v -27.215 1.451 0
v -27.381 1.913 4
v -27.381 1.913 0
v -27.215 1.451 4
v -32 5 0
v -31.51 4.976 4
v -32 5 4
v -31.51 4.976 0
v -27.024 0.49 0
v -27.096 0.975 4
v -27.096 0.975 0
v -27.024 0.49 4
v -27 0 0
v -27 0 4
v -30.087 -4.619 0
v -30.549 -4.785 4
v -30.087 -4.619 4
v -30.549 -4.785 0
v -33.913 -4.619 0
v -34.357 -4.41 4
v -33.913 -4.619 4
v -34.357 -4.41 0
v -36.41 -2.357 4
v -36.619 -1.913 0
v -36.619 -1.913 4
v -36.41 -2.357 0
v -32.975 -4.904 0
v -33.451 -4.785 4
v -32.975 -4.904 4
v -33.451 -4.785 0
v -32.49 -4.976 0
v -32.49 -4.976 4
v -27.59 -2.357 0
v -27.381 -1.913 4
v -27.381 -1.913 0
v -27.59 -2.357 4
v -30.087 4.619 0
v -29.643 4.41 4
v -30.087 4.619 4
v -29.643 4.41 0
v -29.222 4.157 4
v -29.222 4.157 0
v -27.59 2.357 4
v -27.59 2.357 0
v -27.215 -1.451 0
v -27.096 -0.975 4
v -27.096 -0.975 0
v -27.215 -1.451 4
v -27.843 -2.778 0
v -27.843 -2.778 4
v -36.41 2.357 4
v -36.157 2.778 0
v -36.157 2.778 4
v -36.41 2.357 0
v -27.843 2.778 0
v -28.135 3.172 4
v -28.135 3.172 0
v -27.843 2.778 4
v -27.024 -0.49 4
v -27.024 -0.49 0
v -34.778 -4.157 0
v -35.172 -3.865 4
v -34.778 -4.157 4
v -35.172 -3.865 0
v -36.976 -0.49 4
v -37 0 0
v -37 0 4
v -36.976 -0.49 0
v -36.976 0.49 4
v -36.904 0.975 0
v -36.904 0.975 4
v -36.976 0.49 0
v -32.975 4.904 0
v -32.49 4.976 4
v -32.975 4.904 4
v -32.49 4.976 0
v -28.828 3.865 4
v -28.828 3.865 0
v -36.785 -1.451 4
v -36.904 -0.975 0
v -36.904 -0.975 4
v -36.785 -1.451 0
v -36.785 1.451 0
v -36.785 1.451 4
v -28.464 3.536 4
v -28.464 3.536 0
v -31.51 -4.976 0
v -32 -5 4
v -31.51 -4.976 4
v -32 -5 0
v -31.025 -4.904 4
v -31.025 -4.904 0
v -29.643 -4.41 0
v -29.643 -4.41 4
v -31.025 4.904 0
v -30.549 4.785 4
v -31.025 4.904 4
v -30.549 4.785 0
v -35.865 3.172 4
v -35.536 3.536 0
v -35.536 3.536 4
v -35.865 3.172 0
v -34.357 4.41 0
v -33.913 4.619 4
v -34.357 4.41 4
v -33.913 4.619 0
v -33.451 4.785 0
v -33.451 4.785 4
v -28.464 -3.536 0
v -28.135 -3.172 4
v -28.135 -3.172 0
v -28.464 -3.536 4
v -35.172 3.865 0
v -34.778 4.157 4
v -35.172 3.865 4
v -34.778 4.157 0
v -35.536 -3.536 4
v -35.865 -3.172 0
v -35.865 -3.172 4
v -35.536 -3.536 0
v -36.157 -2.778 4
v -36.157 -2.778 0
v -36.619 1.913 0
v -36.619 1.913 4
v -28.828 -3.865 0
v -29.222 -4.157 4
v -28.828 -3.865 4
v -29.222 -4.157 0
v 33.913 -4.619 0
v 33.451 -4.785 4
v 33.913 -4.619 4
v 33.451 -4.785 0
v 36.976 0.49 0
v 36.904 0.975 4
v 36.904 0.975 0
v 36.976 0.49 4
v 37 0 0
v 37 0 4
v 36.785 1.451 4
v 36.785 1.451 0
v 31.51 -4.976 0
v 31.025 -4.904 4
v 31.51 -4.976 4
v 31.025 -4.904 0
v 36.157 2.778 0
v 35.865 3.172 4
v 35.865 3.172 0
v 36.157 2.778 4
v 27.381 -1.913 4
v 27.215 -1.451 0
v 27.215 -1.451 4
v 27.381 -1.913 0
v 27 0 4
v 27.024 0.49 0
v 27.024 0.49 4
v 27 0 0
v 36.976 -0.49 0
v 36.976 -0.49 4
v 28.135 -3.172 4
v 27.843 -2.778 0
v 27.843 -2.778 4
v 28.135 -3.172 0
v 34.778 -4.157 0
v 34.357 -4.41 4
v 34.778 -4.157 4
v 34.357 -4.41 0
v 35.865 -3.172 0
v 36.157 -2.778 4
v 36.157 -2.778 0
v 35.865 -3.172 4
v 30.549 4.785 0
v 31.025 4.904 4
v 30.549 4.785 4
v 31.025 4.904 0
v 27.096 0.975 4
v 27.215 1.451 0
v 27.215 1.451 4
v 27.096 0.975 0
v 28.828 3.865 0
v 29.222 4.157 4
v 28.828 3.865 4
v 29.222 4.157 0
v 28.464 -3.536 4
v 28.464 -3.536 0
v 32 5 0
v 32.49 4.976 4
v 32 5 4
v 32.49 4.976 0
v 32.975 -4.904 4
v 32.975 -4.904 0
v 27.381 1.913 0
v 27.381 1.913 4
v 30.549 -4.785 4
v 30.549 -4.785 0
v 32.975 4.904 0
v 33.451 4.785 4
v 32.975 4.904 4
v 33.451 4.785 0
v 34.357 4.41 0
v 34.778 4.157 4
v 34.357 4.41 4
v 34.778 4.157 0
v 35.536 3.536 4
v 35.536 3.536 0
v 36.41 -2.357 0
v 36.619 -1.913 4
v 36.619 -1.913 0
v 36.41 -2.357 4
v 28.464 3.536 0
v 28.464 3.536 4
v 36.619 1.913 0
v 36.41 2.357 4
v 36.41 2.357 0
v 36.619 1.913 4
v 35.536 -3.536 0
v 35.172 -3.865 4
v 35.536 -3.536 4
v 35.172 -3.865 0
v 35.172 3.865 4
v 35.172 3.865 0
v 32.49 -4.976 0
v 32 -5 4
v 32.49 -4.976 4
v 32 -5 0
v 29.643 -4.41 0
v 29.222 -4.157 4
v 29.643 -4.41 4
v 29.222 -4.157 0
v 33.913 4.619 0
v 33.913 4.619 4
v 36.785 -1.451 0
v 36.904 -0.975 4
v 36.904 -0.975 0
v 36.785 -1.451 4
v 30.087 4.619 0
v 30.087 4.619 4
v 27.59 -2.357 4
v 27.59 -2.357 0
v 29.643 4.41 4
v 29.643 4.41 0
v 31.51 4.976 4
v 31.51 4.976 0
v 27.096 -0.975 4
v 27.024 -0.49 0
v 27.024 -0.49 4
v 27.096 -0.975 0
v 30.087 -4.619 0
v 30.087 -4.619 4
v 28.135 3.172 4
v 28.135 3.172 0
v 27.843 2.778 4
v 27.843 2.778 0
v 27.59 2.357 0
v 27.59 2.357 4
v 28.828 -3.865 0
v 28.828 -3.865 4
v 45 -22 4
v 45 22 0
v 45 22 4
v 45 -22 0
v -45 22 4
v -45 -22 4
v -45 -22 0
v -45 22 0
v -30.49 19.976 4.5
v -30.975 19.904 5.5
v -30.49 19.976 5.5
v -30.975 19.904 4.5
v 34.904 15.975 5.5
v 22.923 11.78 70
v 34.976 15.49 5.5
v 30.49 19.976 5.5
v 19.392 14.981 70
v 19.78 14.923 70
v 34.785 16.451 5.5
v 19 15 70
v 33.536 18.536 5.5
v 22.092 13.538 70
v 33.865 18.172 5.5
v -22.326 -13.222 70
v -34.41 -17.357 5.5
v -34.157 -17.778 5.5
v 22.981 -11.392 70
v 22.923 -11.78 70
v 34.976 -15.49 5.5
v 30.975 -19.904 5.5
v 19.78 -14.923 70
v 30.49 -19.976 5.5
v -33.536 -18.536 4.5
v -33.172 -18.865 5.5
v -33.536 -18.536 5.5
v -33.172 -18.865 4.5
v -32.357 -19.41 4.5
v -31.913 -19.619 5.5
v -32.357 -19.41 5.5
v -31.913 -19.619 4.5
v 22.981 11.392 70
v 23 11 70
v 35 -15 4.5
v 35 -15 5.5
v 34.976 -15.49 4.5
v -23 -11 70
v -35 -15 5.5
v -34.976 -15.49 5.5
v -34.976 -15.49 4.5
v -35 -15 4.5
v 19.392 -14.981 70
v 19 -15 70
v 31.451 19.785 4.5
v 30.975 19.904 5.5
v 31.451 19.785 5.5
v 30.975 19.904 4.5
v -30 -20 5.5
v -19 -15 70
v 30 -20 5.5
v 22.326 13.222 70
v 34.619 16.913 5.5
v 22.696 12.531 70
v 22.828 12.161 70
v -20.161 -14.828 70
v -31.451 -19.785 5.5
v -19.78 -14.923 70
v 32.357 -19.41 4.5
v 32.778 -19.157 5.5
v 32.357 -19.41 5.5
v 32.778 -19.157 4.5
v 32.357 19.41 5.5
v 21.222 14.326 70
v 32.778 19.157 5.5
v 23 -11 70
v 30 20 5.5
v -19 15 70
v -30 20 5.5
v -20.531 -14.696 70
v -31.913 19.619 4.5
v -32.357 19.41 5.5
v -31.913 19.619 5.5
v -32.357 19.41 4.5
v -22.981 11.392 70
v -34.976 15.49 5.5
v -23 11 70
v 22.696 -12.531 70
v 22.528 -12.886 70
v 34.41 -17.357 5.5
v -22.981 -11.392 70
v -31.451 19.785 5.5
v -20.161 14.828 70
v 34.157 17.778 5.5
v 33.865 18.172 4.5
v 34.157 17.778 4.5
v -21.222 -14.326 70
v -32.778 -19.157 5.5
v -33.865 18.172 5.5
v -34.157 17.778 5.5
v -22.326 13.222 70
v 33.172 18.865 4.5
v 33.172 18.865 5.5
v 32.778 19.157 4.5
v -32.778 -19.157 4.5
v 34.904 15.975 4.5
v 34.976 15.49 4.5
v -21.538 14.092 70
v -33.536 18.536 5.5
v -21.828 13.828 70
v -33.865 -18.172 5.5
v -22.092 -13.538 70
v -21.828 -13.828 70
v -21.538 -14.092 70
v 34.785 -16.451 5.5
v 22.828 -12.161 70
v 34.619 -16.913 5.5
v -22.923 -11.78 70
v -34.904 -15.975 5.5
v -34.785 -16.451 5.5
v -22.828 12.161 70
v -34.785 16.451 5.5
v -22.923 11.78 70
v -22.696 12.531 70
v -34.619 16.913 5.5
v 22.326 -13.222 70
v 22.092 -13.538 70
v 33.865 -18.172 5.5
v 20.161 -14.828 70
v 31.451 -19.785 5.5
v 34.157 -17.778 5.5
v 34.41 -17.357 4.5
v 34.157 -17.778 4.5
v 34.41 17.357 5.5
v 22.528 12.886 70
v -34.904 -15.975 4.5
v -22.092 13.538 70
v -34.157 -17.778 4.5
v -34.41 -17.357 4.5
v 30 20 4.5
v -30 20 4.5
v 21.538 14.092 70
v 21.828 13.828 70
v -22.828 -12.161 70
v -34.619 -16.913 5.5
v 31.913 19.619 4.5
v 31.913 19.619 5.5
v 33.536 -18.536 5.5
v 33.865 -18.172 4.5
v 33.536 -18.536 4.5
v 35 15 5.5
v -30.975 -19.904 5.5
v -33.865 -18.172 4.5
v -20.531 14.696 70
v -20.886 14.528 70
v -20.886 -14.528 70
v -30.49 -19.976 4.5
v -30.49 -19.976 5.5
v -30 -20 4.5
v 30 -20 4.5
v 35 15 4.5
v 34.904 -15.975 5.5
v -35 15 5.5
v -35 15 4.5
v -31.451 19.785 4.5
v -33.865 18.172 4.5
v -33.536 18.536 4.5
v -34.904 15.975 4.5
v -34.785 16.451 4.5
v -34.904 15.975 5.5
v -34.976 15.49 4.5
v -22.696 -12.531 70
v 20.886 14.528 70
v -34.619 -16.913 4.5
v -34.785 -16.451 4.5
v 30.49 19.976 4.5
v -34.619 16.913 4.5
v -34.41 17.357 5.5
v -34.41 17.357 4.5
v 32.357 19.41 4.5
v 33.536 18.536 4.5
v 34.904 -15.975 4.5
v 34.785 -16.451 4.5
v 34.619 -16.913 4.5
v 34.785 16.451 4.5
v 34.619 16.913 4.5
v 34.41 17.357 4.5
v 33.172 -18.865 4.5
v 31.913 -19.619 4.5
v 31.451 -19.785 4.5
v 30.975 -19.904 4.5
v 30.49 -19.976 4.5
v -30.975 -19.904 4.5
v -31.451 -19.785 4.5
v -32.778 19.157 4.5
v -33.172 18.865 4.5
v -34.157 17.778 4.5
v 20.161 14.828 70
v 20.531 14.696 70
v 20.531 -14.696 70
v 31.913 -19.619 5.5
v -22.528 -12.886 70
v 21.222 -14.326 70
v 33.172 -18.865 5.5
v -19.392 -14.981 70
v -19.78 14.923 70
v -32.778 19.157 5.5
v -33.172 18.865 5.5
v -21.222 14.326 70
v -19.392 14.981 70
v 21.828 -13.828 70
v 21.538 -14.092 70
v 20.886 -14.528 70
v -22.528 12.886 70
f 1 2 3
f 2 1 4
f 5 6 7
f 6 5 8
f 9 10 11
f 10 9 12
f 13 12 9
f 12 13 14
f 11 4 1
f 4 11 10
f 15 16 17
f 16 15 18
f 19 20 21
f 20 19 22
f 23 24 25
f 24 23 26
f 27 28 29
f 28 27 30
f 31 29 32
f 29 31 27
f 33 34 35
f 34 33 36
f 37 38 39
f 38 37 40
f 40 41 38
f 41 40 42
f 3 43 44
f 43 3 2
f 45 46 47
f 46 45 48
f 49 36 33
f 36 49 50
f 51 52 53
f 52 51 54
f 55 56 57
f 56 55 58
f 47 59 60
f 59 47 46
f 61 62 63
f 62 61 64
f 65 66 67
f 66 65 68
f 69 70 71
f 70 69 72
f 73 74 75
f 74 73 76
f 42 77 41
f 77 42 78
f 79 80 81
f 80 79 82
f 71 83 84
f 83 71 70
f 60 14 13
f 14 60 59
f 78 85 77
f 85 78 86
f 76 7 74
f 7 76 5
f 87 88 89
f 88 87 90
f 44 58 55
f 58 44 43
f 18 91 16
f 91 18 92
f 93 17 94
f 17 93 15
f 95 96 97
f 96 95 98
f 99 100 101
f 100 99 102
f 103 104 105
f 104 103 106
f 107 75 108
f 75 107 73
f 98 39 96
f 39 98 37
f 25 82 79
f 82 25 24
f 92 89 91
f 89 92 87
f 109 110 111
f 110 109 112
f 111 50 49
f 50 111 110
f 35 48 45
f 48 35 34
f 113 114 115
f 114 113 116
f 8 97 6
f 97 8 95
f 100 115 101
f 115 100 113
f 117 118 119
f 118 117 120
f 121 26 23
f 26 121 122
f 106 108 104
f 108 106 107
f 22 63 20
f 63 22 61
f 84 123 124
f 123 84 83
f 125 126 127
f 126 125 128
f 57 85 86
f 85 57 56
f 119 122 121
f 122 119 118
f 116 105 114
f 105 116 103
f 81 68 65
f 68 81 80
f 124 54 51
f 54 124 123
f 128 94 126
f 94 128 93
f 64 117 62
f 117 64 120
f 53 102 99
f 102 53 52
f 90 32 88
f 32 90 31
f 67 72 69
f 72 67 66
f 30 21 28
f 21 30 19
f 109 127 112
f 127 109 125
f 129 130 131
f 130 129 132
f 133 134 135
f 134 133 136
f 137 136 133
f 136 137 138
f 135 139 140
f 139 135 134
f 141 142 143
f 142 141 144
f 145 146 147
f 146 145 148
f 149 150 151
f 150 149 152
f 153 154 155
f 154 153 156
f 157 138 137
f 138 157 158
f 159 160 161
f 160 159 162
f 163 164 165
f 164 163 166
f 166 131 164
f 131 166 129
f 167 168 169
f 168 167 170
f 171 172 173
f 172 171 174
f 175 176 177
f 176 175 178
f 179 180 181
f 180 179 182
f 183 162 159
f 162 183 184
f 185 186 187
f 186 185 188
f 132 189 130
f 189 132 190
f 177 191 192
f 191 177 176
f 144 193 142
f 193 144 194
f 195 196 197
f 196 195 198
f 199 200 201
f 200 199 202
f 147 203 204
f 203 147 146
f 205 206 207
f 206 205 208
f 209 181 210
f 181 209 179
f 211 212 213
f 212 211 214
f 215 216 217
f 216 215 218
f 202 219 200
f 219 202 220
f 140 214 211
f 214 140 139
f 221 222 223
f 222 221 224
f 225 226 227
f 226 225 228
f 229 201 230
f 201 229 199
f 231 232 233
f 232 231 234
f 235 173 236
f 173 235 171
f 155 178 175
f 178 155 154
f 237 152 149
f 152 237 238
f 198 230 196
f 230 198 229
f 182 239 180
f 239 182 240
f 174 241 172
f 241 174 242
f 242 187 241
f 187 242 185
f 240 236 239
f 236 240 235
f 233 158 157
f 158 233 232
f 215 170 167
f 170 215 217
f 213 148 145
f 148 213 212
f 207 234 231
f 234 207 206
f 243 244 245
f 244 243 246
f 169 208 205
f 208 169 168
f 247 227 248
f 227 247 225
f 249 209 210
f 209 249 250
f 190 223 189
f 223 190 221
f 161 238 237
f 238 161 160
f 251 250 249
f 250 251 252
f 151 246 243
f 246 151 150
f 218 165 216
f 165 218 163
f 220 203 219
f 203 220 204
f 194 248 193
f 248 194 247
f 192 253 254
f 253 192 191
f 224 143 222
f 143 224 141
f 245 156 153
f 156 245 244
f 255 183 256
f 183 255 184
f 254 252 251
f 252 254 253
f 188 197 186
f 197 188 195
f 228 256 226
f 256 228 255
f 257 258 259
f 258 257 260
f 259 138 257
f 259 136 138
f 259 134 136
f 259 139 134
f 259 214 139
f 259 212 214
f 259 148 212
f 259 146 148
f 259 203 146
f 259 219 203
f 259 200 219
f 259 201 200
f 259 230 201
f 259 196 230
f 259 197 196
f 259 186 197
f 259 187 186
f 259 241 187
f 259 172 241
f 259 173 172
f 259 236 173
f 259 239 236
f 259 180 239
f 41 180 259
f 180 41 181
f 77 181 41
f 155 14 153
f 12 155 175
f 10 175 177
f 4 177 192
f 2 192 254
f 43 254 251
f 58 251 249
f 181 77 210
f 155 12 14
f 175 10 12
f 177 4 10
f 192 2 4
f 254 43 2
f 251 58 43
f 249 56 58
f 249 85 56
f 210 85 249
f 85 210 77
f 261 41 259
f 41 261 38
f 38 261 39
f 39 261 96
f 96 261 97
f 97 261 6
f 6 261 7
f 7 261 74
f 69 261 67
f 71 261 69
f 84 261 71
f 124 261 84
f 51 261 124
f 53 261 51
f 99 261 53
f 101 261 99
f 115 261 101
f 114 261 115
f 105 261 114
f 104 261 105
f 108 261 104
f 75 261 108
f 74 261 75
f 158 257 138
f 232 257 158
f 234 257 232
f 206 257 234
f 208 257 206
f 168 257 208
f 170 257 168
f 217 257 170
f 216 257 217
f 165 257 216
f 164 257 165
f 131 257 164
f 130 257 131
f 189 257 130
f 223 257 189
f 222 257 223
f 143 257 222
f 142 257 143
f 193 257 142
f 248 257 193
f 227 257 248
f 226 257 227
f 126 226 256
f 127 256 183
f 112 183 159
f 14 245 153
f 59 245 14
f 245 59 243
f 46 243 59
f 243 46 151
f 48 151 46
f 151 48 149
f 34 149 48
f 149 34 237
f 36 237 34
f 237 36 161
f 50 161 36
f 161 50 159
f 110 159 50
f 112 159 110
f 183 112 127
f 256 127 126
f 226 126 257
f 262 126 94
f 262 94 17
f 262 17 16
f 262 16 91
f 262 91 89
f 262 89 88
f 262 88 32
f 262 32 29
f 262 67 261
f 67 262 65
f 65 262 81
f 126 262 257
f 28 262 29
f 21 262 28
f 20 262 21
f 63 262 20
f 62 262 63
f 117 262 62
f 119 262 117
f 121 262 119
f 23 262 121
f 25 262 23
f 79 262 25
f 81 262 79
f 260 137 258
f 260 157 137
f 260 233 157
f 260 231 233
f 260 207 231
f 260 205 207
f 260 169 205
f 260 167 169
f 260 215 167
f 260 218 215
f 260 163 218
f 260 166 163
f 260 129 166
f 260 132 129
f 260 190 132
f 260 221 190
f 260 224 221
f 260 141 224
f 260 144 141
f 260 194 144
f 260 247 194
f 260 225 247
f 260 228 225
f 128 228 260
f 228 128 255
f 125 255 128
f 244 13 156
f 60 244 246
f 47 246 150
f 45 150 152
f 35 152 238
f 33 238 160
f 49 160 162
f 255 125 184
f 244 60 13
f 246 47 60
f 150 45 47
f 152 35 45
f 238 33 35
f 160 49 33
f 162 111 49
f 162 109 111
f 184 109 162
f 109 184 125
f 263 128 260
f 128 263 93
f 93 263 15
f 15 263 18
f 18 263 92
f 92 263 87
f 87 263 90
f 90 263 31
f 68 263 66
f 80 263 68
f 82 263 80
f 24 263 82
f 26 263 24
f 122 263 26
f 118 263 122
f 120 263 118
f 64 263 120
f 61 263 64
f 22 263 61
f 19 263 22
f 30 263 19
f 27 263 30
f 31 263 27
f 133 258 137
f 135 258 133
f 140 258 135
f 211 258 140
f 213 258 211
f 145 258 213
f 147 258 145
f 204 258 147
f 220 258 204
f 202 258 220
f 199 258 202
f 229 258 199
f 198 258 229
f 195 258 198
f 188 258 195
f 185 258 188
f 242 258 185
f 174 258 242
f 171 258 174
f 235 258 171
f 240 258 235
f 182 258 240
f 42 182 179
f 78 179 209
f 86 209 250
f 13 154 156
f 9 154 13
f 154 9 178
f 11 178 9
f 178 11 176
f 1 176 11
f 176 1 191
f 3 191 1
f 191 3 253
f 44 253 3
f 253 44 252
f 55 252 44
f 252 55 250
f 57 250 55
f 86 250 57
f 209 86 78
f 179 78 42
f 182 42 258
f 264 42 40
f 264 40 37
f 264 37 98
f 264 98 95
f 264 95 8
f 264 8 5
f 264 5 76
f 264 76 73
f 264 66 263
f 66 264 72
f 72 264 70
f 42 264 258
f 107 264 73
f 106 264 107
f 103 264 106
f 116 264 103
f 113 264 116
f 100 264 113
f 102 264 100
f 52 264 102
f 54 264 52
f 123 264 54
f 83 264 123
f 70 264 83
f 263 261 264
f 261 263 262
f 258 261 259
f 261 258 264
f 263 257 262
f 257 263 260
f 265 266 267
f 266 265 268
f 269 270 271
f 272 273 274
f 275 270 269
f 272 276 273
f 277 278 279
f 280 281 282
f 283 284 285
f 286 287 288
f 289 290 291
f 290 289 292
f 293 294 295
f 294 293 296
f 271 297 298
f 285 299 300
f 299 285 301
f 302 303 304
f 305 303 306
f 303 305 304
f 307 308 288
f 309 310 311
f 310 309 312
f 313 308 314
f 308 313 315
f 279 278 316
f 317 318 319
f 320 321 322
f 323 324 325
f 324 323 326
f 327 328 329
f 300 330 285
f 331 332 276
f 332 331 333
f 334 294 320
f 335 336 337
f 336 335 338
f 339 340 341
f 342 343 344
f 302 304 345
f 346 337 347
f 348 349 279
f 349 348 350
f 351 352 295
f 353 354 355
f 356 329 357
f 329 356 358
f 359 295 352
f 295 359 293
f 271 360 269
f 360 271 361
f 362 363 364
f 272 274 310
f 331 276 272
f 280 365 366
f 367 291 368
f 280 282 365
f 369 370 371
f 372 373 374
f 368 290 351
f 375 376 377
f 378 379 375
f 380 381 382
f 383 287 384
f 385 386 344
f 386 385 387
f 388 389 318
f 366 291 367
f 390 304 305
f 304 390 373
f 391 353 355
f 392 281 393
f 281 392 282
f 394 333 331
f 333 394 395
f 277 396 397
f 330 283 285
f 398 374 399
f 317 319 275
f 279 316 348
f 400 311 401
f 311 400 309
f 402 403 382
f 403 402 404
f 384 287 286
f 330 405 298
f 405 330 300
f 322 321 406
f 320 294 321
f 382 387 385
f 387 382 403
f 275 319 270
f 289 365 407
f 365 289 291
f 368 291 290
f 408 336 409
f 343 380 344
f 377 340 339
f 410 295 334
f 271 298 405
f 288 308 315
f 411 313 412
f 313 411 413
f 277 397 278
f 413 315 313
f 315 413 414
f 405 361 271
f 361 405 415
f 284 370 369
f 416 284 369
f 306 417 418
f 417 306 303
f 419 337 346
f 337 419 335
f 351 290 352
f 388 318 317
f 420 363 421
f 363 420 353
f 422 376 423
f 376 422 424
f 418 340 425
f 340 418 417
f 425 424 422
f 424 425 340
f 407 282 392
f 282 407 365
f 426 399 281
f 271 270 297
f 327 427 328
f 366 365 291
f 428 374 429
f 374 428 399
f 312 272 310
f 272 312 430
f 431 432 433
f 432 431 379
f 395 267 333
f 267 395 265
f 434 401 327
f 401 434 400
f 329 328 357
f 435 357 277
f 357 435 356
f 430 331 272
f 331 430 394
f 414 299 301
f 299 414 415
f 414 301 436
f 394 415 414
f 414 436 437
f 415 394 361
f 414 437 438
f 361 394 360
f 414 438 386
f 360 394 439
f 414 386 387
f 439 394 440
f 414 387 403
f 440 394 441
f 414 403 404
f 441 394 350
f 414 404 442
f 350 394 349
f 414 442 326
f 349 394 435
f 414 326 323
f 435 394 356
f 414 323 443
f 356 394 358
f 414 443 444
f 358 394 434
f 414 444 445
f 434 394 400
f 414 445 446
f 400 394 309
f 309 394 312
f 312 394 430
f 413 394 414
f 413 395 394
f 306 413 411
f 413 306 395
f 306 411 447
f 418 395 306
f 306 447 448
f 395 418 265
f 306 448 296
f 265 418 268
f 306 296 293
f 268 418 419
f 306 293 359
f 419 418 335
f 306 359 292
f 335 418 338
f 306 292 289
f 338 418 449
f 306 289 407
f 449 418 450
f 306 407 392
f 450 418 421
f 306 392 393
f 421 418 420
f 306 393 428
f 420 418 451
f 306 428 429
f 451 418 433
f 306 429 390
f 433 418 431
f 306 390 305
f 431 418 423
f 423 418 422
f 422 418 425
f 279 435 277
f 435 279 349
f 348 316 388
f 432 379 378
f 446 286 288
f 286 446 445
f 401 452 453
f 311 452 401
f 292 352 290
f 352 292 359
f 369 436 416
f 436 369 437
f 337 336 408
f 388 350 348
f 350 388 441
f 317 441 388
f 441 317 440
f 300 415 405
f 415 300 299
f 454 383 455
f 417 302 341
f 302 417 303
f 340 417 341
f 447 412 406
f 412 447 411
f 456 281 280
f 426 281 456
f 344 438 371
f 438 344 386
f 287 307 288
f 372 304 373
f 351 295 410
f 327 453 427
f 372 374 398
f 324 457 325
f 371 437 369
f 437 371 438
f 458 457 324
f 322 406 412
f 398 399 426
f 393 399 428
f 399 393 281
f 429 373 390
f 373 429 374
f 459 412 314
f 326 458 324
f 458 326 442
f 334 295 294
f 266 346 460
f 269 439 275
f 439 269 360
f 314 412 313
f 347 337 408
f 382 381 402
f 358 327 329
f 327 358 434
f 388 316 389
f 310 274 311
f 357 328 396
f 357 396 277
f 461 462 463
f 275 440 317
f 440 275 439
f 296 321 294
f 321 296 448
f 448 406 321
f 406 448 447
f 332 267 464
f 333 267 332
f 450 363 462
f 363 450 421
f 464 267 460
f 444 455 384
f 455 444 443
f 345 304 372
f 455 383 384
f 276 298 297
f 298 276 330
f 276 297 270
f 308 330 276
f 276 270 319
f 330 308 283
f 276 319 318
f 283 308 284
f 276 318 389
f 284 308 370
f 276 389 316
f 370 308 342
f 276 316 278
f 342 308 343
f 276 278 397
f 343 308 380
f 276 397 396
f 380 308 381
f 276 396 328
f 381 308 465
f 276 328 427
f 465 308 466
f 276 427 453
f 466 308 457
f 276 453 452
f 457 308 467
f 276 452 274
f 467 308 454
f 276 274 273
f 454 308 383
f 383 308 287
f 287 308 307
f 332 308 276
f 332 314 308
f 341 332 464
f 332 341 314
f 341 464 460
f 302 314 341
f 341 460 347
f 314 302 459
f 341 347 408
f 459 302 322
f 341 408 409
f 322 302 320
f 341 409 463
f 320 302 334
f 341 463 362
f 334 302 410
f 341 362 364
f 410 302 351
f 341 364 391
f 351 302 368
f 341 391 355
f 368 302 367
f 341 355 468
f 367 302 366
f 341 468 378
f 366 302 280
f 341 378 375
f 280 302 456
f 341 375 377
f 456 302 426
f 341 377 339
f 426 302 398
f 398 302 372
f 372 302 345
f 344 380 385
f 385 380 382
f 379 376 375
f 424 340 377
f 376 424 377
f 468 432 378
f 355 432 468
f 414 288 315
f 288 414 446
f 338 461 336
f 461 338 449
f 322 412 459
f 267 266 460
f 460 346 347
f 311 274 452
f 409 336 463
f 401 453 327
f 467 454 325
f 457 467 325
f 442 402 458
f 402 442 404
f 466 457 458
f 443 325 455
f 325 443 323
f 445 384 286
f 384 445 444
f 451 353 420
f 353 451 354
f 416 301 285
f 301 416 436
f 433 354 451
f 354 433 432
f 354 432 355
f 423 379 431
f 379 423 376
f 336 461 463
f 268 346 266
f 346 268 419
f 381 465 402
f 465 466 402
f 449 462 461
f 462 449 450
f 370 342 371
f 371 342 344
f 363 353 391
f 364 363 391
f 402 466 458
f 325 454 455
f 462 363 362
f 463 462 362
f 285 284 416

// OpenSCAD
// BUMP-60010 rear pair bump stop model
// J40 rubber recreation 3D model, units: millimetres.
// Generated by tools/generate_rubber_recreation_3d_models.py.
// OpenSCAD is the source model; export STL only after release parameters are set.

$fn = 64;

module rounded_rect_2d(size, r) {
  hull() {
    translate([-(size[0] / 2 - r), -(size[1] / 2 - r)]) circle(r = r);
    translate([ (size[0] / 2 - r), -(size[1] / 2 - r)]) circle(r = r);
    translate([ (size[0] / 2 - r),  (size[1] / 2 - r)]) circle(r = r);
    translate([-(size[0] / 2 - r),  (size[1] / 2 - r)]) circle(r = r);
  }
}

module capsule_2d(length, width) {
  hull() {
    translate([-(length - width) / 2, 0]) circle(d = width);
    translate([ (length - width) / 2, 0]) circle(d = width);
  }
}

module chamfered_extrude(height, edge_chamfer = 0) {
  eps = 0.01;
  if (edge_chamfer <= 0) {
    linear_extrude(height = height, center = false)
      children();
  } else {
    union() {
      translate([0, 0, edge_chamfer])
        linear_extrude(height = height - (2 * edge_chamfer), center = false)
          children();

      hull() {
        translate([0, 0, 0])
          linear_extrude(height = eps, center = false)
            offset(delta = -edge_chamfer)
              children();
        translate([0, 0, edge_chamfer])
          linear_extrude(height = eps, center = false)
            children();
      }

      hull() {
        translate([0, 0, height - edge_chamfer])
          linear_extrude(height = eps, center = false)
            children();
        translate([0, 0, height - eps])
          linear_extrude(height = eps, center = false)
            offset(delta = -edge_chamfer)
              children();
      }
    }
  }
}

// Vehicle-measurement model:
// - Height is the known Toyota-family control.
// - Saddle length/width, bolt pitch, bolt diameter, and strike offset must come
//   from the cleaned vehicle bracket and axle strike pad.
// - Mounting holes are only in the steel saddle; do not add rubber through-holes
//   unless a genuine sample proves molded clearance holes.
// - This model is a first-article conversation shape, not a released mould.

module b_60010_rear_pair_measurement_model(
  free_height = 70,
  saddle_length = 90,
  saddle_width = 44,
  saddle_thickness = 4,
  bolt_pitch = 64,
  bolt_d = 10,
  top_length = 46,
  top_width = 30,
  rubber_base_length = 70,
  rubber_base_width = 40
) {
  color("silver")
    difference() {
      translate([0, 0, saddle_thickness / 2])
        cube([saddle_length, saddle_width, saddle_thickness], center = true);
      for (x = [-bolt_pitch / 2, bolt_pitch / 2])
        translate([x, 0, -1])
          cylinder(h = saddle_thickness + 2, d = bolt_d);
    }

  color("black")
    translate([0, 0, saddle_thickness])
      hull() {
        translate([0, 0, 0.5])
          linear_extrude(height = 1, center = false)
            rounded_rect_2d([rubber_base_length, rubber_base_width], 5);
        translate([0, 0, free_height - saddle_thickness - 1])
          linear_extrude(height = 1, center = false)
            rounded_rect_2d([top_length, top_width], 4);
      }
}

b_60010_rear_pair_measurement_model();
